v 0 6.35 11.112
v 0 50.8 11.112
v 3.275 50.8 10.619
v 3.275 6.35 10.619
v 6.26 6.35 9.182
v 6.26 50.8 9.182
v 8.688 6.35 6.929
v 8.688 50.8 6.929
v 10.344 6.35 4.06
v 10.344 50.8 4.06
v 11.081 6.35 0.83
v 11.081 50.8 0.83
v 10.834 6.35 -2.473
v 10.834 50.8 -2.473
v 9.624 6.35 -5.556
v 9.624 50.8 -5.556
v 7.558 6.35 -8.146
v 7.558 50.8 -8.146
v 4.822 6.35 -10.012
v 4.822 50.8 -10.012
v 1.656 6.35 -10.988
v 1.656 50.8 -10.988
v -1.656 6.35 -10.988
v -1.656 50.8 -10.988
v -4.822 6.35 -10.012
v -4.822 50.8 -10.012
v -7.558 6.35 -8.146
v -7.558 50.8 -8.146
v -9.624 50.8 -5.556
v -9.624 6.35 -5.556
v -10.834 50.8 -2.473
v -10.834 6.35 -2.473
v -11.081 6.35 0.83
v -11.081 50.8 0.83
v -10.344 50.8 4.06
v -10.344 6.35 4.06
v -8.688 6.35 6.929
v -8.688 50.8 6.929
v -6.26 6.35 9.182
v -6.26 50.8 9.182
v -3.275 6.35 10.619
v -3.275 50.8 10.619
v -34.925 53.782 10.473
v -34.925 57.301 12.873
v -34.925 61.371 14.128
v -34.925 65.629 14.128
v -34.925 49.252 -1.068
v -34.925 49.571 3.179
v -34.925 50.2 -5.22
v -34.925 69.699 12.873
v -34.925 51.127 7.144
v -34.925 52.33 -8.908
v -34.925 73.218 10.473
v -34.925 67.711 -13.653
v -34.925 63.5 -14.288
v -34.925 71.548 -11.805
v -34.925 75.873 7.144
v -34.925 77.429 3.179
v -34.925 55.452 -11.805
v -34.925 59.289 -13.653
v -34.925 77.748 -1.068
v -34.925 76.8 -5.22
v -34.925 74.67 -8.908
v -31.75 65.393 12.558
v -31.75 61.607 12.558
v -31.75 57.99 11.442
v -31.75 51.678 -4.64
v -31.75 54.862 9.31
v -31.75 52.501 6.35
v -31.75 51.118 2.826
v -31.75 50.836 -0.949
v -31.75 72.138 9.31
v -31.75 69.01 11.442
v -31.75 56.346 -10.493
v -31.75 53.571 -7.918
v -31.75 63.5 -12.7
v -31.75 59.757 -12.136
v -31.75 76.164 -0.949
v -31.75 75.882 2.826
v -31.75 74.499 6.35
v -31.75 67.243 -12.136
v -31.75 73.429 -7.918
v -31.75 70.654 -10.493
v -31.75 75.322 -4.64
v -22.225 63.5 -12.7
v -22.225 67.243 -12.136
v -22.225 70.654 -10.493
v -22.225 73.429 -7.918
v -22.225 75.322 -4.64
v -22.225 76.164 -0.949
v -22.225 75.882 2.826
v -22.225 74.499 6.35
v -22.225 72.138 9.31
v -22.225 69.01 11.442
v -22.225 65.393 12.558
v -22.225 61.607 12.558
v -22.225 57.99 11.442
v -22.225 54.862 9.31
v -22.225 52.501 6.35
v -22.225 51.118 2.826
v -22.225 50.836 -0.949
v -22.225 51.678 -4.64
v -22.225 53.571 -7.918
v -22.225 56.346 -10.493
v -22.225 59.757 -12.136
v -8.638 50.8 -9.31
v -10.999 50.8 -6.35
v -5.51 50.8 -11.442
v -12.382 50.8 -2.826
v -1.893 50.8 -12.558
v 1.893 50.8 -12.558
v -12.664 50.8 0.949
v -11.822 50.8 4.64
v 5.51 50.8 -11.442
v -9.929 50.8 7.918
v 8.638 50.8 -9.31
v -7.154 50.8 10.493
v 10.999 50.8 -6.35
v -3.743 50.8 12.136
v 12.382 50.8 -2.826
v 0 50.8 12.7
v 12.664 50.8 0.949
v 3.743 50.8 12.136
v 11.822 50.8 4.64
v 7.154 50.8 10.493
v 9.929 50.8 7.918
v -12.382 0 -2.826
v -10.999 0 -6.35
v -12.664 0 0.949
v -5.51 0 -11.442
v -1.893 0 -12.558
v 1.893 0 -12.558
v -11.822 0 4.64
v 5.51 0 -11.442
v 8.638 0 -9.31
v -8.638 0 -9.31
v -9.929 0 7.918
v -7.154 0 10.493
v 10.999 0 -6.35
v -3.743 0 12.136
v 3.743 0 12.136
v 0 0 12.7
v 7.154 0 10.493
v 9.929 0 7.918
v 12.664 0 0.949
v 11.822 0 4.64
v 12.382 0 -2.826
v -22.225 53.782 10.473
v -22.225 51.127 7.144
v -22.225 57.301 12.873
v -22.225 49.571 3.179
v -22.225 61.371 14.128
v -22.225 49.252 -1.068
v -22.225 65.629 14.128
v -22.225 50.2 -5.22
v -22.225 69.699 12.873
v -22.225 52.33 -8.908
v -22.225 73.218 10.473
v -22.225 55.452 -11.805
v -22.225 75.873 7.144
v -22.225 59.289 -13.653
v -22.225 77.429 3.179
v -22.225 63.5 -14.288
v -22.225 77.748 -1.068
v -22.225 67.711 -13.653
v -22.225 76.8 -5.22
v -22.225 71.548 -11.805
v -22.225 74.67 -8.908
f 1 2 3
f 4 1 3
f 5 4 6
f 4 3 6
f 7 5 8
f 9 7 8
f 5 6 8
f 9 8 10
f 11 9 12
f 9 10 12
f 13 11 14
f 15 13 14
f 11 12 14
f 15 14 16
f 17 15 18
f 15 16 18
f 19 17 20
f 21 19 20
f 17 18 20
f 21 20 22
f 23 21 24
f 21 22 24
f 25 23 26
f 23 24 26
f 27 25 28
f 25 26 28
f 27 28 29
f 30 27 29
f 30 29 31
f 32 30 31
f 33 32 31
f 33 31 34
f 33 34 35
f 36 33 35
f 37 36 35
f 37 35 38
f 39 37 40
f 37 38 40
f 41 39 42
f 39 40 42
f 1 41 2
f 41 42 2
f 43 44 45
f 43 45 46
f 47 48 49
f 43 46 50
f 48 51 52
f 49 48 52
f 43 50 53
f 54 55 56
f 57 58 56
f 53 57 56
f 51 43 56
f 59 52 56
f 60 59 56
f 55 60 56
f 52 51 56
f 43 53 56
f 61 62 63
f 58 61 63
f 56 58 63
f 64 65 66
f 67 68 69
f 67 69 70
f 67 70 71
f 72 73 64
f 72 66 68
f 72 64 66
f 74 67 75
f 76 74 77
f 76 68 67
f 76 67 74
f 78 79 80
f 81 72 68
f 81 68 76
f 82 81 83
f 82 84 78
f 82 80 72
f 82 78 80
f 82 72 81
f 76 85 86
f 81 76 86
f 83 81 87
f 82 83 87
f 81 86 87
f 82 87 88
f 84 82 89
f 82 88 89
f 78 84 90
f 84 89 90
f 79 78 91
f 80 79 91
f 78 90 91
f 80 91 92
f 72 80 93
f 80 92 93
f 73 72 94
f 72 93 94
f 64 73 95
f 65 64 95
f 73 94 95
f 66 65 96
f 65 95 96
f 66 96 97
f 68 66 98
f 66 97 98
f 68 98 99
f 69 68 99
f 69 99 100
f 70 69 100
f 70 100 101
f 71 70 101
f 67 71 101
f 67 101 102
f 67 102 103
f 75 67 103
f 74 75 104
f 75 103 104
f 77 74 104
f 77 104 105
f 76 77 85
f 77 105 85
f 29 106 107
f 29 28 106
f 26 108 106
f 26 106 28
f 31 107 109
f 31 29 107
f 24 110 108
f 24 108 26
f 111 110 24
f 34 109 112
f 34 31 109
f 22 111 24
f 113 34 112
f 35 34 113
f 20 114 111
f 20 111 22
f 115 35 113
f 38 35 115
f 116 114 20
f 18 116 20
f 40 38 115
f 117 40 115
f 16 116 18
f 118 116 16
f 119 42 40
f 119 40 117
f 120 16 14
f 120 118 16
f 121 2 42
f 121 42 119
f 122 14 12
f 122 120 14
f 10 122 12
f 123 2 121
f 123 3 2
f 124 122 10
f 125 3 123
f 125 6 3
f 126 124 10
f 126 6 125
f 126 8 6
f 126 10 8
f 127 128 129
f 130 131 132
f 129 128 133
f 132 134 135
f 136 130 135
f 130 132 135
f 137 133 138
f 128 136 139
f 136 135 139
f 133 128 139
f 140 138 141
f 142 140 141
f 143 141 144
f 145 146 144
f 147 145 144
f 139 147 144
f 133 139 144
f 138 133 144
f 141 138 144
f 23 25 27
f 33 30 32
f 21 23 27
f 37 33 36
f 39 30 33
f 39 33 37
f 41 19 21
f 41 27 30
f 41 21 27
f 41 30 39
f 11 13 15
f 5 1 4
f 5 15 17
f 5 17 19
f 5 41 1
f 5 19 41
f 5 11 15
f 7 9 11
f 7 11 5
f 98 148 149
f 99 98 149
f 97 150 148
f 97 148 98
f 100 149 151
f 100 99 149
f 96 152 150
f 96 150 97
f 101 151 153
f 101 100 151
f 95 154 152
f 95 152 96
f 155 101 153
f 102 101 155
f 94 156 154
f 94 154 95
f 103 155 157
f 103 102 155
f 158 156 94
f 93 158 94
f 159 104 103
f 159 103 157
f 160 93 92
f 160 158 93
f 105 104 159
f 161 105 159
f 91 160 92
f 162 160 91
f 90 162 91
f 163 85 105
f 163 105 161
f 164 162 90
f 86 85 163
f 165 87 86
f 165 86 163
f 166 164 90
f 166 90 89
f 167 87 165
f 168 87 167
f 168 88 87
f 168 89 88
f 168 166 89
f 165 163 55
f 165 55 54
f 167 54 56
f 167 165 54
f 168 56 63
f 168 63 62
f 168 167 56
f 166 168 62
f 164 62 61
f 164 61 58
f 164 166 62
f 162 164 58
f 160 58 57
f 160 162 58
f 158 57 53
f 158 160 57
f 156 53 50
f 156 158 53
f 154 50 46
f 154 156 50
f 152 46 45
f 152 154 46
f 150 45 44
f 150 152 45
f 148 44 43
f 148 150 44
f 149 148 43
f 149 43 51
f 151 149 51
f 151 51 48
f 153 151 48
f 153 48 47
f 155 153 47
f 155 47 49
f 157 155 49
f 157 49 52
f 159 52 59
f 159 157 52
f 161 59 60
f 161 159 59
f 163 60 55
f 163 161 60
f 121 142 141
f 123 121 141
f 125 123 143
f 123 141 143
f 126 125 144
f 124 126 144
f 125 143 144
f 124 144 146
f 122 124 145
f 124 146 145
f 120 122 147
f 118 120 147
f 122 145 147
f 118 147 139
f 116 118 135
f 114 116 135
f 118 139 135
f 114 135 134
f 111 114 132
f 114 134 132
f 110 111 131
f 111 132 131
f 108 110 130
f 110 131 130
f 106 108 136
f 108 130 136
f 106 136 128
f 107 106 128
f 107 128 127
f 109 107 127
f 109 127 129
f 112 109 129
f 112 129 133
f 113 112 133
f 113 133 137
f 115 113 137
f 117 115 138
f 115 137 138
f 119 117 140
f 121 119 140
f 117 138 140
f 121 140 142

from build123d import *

# Parameters (mm, degrees)
SKETCH1_R           = 12.7
BOSS_EXTRUDE1_DEPTH = 50.8
SKETCH2_R           = 11.1125
CUT_EXTRUDE1_DEPTH  = 44.45
SKETCH3_R           = 14.2875
BOSS_EXTRUDE2_DEPTH = 12.7
SKETCH4_R           = 12.7
CUT_EXTRUDE2_DEPTH  = 9.525


with BuildPart() as part:
    # Sketch1 → Boss-Extrude1 (new body)
    with BuildSketch(Plane(origin=(0, 0, 0), x_dir=(1, 0, 0), z_dir=(0, 1, 0))):
        with Locations(Location((0, 0, 0), (0, 0, 270))):
            Circle(SKETCH1_R)
    extrude(amount=BOSS_EXTRUDE1_DEPTH)

    # Sketch2 → Cut-Extrude1 (cut)
    with BuildSketch(Plane(origin=(0, 50.8, 0), x_dir=(1, 0, 0), z_dir=(0, 1, 0))):
        with Locations(Location((0, 0, 0), (0, 0, 270))):
            Circle(SKETCH2_R)
    extrude(amount=-CUT_EXTRUDE1_DEPTH, mode=Mode.SUBTRACT)


with BuildPart() as body_2:
    # Sketch3 → Boss-Extrude2 (new body)
    with BuildSketch(Plane(origin=(-22.225, 0, 0), x_dir=(0, 0, -1), z_dir=(1, 0, 0))):
        with Locations((0, 63.5)):
            Circle(SKETCH3_R)
    extrude(amount=-BOSS_EXTRUDE2_DEPTH)

    # Sketch4 → Cut-Extrude2 (cut)
    with BuildSketch(Plane(origin=(-22.225, 0, 0), x_dir=(0, 0, -1), z_dir=(1, 0, 0))):
        with Locations((0, 63.5)):
            Circle(SKETCH4_R)
    extrude(amount=-CUT_EXTRUDE2_DEPTH, mode=Mode.SUBTRACT)


solid = Compound([part.part, body_2.part])
